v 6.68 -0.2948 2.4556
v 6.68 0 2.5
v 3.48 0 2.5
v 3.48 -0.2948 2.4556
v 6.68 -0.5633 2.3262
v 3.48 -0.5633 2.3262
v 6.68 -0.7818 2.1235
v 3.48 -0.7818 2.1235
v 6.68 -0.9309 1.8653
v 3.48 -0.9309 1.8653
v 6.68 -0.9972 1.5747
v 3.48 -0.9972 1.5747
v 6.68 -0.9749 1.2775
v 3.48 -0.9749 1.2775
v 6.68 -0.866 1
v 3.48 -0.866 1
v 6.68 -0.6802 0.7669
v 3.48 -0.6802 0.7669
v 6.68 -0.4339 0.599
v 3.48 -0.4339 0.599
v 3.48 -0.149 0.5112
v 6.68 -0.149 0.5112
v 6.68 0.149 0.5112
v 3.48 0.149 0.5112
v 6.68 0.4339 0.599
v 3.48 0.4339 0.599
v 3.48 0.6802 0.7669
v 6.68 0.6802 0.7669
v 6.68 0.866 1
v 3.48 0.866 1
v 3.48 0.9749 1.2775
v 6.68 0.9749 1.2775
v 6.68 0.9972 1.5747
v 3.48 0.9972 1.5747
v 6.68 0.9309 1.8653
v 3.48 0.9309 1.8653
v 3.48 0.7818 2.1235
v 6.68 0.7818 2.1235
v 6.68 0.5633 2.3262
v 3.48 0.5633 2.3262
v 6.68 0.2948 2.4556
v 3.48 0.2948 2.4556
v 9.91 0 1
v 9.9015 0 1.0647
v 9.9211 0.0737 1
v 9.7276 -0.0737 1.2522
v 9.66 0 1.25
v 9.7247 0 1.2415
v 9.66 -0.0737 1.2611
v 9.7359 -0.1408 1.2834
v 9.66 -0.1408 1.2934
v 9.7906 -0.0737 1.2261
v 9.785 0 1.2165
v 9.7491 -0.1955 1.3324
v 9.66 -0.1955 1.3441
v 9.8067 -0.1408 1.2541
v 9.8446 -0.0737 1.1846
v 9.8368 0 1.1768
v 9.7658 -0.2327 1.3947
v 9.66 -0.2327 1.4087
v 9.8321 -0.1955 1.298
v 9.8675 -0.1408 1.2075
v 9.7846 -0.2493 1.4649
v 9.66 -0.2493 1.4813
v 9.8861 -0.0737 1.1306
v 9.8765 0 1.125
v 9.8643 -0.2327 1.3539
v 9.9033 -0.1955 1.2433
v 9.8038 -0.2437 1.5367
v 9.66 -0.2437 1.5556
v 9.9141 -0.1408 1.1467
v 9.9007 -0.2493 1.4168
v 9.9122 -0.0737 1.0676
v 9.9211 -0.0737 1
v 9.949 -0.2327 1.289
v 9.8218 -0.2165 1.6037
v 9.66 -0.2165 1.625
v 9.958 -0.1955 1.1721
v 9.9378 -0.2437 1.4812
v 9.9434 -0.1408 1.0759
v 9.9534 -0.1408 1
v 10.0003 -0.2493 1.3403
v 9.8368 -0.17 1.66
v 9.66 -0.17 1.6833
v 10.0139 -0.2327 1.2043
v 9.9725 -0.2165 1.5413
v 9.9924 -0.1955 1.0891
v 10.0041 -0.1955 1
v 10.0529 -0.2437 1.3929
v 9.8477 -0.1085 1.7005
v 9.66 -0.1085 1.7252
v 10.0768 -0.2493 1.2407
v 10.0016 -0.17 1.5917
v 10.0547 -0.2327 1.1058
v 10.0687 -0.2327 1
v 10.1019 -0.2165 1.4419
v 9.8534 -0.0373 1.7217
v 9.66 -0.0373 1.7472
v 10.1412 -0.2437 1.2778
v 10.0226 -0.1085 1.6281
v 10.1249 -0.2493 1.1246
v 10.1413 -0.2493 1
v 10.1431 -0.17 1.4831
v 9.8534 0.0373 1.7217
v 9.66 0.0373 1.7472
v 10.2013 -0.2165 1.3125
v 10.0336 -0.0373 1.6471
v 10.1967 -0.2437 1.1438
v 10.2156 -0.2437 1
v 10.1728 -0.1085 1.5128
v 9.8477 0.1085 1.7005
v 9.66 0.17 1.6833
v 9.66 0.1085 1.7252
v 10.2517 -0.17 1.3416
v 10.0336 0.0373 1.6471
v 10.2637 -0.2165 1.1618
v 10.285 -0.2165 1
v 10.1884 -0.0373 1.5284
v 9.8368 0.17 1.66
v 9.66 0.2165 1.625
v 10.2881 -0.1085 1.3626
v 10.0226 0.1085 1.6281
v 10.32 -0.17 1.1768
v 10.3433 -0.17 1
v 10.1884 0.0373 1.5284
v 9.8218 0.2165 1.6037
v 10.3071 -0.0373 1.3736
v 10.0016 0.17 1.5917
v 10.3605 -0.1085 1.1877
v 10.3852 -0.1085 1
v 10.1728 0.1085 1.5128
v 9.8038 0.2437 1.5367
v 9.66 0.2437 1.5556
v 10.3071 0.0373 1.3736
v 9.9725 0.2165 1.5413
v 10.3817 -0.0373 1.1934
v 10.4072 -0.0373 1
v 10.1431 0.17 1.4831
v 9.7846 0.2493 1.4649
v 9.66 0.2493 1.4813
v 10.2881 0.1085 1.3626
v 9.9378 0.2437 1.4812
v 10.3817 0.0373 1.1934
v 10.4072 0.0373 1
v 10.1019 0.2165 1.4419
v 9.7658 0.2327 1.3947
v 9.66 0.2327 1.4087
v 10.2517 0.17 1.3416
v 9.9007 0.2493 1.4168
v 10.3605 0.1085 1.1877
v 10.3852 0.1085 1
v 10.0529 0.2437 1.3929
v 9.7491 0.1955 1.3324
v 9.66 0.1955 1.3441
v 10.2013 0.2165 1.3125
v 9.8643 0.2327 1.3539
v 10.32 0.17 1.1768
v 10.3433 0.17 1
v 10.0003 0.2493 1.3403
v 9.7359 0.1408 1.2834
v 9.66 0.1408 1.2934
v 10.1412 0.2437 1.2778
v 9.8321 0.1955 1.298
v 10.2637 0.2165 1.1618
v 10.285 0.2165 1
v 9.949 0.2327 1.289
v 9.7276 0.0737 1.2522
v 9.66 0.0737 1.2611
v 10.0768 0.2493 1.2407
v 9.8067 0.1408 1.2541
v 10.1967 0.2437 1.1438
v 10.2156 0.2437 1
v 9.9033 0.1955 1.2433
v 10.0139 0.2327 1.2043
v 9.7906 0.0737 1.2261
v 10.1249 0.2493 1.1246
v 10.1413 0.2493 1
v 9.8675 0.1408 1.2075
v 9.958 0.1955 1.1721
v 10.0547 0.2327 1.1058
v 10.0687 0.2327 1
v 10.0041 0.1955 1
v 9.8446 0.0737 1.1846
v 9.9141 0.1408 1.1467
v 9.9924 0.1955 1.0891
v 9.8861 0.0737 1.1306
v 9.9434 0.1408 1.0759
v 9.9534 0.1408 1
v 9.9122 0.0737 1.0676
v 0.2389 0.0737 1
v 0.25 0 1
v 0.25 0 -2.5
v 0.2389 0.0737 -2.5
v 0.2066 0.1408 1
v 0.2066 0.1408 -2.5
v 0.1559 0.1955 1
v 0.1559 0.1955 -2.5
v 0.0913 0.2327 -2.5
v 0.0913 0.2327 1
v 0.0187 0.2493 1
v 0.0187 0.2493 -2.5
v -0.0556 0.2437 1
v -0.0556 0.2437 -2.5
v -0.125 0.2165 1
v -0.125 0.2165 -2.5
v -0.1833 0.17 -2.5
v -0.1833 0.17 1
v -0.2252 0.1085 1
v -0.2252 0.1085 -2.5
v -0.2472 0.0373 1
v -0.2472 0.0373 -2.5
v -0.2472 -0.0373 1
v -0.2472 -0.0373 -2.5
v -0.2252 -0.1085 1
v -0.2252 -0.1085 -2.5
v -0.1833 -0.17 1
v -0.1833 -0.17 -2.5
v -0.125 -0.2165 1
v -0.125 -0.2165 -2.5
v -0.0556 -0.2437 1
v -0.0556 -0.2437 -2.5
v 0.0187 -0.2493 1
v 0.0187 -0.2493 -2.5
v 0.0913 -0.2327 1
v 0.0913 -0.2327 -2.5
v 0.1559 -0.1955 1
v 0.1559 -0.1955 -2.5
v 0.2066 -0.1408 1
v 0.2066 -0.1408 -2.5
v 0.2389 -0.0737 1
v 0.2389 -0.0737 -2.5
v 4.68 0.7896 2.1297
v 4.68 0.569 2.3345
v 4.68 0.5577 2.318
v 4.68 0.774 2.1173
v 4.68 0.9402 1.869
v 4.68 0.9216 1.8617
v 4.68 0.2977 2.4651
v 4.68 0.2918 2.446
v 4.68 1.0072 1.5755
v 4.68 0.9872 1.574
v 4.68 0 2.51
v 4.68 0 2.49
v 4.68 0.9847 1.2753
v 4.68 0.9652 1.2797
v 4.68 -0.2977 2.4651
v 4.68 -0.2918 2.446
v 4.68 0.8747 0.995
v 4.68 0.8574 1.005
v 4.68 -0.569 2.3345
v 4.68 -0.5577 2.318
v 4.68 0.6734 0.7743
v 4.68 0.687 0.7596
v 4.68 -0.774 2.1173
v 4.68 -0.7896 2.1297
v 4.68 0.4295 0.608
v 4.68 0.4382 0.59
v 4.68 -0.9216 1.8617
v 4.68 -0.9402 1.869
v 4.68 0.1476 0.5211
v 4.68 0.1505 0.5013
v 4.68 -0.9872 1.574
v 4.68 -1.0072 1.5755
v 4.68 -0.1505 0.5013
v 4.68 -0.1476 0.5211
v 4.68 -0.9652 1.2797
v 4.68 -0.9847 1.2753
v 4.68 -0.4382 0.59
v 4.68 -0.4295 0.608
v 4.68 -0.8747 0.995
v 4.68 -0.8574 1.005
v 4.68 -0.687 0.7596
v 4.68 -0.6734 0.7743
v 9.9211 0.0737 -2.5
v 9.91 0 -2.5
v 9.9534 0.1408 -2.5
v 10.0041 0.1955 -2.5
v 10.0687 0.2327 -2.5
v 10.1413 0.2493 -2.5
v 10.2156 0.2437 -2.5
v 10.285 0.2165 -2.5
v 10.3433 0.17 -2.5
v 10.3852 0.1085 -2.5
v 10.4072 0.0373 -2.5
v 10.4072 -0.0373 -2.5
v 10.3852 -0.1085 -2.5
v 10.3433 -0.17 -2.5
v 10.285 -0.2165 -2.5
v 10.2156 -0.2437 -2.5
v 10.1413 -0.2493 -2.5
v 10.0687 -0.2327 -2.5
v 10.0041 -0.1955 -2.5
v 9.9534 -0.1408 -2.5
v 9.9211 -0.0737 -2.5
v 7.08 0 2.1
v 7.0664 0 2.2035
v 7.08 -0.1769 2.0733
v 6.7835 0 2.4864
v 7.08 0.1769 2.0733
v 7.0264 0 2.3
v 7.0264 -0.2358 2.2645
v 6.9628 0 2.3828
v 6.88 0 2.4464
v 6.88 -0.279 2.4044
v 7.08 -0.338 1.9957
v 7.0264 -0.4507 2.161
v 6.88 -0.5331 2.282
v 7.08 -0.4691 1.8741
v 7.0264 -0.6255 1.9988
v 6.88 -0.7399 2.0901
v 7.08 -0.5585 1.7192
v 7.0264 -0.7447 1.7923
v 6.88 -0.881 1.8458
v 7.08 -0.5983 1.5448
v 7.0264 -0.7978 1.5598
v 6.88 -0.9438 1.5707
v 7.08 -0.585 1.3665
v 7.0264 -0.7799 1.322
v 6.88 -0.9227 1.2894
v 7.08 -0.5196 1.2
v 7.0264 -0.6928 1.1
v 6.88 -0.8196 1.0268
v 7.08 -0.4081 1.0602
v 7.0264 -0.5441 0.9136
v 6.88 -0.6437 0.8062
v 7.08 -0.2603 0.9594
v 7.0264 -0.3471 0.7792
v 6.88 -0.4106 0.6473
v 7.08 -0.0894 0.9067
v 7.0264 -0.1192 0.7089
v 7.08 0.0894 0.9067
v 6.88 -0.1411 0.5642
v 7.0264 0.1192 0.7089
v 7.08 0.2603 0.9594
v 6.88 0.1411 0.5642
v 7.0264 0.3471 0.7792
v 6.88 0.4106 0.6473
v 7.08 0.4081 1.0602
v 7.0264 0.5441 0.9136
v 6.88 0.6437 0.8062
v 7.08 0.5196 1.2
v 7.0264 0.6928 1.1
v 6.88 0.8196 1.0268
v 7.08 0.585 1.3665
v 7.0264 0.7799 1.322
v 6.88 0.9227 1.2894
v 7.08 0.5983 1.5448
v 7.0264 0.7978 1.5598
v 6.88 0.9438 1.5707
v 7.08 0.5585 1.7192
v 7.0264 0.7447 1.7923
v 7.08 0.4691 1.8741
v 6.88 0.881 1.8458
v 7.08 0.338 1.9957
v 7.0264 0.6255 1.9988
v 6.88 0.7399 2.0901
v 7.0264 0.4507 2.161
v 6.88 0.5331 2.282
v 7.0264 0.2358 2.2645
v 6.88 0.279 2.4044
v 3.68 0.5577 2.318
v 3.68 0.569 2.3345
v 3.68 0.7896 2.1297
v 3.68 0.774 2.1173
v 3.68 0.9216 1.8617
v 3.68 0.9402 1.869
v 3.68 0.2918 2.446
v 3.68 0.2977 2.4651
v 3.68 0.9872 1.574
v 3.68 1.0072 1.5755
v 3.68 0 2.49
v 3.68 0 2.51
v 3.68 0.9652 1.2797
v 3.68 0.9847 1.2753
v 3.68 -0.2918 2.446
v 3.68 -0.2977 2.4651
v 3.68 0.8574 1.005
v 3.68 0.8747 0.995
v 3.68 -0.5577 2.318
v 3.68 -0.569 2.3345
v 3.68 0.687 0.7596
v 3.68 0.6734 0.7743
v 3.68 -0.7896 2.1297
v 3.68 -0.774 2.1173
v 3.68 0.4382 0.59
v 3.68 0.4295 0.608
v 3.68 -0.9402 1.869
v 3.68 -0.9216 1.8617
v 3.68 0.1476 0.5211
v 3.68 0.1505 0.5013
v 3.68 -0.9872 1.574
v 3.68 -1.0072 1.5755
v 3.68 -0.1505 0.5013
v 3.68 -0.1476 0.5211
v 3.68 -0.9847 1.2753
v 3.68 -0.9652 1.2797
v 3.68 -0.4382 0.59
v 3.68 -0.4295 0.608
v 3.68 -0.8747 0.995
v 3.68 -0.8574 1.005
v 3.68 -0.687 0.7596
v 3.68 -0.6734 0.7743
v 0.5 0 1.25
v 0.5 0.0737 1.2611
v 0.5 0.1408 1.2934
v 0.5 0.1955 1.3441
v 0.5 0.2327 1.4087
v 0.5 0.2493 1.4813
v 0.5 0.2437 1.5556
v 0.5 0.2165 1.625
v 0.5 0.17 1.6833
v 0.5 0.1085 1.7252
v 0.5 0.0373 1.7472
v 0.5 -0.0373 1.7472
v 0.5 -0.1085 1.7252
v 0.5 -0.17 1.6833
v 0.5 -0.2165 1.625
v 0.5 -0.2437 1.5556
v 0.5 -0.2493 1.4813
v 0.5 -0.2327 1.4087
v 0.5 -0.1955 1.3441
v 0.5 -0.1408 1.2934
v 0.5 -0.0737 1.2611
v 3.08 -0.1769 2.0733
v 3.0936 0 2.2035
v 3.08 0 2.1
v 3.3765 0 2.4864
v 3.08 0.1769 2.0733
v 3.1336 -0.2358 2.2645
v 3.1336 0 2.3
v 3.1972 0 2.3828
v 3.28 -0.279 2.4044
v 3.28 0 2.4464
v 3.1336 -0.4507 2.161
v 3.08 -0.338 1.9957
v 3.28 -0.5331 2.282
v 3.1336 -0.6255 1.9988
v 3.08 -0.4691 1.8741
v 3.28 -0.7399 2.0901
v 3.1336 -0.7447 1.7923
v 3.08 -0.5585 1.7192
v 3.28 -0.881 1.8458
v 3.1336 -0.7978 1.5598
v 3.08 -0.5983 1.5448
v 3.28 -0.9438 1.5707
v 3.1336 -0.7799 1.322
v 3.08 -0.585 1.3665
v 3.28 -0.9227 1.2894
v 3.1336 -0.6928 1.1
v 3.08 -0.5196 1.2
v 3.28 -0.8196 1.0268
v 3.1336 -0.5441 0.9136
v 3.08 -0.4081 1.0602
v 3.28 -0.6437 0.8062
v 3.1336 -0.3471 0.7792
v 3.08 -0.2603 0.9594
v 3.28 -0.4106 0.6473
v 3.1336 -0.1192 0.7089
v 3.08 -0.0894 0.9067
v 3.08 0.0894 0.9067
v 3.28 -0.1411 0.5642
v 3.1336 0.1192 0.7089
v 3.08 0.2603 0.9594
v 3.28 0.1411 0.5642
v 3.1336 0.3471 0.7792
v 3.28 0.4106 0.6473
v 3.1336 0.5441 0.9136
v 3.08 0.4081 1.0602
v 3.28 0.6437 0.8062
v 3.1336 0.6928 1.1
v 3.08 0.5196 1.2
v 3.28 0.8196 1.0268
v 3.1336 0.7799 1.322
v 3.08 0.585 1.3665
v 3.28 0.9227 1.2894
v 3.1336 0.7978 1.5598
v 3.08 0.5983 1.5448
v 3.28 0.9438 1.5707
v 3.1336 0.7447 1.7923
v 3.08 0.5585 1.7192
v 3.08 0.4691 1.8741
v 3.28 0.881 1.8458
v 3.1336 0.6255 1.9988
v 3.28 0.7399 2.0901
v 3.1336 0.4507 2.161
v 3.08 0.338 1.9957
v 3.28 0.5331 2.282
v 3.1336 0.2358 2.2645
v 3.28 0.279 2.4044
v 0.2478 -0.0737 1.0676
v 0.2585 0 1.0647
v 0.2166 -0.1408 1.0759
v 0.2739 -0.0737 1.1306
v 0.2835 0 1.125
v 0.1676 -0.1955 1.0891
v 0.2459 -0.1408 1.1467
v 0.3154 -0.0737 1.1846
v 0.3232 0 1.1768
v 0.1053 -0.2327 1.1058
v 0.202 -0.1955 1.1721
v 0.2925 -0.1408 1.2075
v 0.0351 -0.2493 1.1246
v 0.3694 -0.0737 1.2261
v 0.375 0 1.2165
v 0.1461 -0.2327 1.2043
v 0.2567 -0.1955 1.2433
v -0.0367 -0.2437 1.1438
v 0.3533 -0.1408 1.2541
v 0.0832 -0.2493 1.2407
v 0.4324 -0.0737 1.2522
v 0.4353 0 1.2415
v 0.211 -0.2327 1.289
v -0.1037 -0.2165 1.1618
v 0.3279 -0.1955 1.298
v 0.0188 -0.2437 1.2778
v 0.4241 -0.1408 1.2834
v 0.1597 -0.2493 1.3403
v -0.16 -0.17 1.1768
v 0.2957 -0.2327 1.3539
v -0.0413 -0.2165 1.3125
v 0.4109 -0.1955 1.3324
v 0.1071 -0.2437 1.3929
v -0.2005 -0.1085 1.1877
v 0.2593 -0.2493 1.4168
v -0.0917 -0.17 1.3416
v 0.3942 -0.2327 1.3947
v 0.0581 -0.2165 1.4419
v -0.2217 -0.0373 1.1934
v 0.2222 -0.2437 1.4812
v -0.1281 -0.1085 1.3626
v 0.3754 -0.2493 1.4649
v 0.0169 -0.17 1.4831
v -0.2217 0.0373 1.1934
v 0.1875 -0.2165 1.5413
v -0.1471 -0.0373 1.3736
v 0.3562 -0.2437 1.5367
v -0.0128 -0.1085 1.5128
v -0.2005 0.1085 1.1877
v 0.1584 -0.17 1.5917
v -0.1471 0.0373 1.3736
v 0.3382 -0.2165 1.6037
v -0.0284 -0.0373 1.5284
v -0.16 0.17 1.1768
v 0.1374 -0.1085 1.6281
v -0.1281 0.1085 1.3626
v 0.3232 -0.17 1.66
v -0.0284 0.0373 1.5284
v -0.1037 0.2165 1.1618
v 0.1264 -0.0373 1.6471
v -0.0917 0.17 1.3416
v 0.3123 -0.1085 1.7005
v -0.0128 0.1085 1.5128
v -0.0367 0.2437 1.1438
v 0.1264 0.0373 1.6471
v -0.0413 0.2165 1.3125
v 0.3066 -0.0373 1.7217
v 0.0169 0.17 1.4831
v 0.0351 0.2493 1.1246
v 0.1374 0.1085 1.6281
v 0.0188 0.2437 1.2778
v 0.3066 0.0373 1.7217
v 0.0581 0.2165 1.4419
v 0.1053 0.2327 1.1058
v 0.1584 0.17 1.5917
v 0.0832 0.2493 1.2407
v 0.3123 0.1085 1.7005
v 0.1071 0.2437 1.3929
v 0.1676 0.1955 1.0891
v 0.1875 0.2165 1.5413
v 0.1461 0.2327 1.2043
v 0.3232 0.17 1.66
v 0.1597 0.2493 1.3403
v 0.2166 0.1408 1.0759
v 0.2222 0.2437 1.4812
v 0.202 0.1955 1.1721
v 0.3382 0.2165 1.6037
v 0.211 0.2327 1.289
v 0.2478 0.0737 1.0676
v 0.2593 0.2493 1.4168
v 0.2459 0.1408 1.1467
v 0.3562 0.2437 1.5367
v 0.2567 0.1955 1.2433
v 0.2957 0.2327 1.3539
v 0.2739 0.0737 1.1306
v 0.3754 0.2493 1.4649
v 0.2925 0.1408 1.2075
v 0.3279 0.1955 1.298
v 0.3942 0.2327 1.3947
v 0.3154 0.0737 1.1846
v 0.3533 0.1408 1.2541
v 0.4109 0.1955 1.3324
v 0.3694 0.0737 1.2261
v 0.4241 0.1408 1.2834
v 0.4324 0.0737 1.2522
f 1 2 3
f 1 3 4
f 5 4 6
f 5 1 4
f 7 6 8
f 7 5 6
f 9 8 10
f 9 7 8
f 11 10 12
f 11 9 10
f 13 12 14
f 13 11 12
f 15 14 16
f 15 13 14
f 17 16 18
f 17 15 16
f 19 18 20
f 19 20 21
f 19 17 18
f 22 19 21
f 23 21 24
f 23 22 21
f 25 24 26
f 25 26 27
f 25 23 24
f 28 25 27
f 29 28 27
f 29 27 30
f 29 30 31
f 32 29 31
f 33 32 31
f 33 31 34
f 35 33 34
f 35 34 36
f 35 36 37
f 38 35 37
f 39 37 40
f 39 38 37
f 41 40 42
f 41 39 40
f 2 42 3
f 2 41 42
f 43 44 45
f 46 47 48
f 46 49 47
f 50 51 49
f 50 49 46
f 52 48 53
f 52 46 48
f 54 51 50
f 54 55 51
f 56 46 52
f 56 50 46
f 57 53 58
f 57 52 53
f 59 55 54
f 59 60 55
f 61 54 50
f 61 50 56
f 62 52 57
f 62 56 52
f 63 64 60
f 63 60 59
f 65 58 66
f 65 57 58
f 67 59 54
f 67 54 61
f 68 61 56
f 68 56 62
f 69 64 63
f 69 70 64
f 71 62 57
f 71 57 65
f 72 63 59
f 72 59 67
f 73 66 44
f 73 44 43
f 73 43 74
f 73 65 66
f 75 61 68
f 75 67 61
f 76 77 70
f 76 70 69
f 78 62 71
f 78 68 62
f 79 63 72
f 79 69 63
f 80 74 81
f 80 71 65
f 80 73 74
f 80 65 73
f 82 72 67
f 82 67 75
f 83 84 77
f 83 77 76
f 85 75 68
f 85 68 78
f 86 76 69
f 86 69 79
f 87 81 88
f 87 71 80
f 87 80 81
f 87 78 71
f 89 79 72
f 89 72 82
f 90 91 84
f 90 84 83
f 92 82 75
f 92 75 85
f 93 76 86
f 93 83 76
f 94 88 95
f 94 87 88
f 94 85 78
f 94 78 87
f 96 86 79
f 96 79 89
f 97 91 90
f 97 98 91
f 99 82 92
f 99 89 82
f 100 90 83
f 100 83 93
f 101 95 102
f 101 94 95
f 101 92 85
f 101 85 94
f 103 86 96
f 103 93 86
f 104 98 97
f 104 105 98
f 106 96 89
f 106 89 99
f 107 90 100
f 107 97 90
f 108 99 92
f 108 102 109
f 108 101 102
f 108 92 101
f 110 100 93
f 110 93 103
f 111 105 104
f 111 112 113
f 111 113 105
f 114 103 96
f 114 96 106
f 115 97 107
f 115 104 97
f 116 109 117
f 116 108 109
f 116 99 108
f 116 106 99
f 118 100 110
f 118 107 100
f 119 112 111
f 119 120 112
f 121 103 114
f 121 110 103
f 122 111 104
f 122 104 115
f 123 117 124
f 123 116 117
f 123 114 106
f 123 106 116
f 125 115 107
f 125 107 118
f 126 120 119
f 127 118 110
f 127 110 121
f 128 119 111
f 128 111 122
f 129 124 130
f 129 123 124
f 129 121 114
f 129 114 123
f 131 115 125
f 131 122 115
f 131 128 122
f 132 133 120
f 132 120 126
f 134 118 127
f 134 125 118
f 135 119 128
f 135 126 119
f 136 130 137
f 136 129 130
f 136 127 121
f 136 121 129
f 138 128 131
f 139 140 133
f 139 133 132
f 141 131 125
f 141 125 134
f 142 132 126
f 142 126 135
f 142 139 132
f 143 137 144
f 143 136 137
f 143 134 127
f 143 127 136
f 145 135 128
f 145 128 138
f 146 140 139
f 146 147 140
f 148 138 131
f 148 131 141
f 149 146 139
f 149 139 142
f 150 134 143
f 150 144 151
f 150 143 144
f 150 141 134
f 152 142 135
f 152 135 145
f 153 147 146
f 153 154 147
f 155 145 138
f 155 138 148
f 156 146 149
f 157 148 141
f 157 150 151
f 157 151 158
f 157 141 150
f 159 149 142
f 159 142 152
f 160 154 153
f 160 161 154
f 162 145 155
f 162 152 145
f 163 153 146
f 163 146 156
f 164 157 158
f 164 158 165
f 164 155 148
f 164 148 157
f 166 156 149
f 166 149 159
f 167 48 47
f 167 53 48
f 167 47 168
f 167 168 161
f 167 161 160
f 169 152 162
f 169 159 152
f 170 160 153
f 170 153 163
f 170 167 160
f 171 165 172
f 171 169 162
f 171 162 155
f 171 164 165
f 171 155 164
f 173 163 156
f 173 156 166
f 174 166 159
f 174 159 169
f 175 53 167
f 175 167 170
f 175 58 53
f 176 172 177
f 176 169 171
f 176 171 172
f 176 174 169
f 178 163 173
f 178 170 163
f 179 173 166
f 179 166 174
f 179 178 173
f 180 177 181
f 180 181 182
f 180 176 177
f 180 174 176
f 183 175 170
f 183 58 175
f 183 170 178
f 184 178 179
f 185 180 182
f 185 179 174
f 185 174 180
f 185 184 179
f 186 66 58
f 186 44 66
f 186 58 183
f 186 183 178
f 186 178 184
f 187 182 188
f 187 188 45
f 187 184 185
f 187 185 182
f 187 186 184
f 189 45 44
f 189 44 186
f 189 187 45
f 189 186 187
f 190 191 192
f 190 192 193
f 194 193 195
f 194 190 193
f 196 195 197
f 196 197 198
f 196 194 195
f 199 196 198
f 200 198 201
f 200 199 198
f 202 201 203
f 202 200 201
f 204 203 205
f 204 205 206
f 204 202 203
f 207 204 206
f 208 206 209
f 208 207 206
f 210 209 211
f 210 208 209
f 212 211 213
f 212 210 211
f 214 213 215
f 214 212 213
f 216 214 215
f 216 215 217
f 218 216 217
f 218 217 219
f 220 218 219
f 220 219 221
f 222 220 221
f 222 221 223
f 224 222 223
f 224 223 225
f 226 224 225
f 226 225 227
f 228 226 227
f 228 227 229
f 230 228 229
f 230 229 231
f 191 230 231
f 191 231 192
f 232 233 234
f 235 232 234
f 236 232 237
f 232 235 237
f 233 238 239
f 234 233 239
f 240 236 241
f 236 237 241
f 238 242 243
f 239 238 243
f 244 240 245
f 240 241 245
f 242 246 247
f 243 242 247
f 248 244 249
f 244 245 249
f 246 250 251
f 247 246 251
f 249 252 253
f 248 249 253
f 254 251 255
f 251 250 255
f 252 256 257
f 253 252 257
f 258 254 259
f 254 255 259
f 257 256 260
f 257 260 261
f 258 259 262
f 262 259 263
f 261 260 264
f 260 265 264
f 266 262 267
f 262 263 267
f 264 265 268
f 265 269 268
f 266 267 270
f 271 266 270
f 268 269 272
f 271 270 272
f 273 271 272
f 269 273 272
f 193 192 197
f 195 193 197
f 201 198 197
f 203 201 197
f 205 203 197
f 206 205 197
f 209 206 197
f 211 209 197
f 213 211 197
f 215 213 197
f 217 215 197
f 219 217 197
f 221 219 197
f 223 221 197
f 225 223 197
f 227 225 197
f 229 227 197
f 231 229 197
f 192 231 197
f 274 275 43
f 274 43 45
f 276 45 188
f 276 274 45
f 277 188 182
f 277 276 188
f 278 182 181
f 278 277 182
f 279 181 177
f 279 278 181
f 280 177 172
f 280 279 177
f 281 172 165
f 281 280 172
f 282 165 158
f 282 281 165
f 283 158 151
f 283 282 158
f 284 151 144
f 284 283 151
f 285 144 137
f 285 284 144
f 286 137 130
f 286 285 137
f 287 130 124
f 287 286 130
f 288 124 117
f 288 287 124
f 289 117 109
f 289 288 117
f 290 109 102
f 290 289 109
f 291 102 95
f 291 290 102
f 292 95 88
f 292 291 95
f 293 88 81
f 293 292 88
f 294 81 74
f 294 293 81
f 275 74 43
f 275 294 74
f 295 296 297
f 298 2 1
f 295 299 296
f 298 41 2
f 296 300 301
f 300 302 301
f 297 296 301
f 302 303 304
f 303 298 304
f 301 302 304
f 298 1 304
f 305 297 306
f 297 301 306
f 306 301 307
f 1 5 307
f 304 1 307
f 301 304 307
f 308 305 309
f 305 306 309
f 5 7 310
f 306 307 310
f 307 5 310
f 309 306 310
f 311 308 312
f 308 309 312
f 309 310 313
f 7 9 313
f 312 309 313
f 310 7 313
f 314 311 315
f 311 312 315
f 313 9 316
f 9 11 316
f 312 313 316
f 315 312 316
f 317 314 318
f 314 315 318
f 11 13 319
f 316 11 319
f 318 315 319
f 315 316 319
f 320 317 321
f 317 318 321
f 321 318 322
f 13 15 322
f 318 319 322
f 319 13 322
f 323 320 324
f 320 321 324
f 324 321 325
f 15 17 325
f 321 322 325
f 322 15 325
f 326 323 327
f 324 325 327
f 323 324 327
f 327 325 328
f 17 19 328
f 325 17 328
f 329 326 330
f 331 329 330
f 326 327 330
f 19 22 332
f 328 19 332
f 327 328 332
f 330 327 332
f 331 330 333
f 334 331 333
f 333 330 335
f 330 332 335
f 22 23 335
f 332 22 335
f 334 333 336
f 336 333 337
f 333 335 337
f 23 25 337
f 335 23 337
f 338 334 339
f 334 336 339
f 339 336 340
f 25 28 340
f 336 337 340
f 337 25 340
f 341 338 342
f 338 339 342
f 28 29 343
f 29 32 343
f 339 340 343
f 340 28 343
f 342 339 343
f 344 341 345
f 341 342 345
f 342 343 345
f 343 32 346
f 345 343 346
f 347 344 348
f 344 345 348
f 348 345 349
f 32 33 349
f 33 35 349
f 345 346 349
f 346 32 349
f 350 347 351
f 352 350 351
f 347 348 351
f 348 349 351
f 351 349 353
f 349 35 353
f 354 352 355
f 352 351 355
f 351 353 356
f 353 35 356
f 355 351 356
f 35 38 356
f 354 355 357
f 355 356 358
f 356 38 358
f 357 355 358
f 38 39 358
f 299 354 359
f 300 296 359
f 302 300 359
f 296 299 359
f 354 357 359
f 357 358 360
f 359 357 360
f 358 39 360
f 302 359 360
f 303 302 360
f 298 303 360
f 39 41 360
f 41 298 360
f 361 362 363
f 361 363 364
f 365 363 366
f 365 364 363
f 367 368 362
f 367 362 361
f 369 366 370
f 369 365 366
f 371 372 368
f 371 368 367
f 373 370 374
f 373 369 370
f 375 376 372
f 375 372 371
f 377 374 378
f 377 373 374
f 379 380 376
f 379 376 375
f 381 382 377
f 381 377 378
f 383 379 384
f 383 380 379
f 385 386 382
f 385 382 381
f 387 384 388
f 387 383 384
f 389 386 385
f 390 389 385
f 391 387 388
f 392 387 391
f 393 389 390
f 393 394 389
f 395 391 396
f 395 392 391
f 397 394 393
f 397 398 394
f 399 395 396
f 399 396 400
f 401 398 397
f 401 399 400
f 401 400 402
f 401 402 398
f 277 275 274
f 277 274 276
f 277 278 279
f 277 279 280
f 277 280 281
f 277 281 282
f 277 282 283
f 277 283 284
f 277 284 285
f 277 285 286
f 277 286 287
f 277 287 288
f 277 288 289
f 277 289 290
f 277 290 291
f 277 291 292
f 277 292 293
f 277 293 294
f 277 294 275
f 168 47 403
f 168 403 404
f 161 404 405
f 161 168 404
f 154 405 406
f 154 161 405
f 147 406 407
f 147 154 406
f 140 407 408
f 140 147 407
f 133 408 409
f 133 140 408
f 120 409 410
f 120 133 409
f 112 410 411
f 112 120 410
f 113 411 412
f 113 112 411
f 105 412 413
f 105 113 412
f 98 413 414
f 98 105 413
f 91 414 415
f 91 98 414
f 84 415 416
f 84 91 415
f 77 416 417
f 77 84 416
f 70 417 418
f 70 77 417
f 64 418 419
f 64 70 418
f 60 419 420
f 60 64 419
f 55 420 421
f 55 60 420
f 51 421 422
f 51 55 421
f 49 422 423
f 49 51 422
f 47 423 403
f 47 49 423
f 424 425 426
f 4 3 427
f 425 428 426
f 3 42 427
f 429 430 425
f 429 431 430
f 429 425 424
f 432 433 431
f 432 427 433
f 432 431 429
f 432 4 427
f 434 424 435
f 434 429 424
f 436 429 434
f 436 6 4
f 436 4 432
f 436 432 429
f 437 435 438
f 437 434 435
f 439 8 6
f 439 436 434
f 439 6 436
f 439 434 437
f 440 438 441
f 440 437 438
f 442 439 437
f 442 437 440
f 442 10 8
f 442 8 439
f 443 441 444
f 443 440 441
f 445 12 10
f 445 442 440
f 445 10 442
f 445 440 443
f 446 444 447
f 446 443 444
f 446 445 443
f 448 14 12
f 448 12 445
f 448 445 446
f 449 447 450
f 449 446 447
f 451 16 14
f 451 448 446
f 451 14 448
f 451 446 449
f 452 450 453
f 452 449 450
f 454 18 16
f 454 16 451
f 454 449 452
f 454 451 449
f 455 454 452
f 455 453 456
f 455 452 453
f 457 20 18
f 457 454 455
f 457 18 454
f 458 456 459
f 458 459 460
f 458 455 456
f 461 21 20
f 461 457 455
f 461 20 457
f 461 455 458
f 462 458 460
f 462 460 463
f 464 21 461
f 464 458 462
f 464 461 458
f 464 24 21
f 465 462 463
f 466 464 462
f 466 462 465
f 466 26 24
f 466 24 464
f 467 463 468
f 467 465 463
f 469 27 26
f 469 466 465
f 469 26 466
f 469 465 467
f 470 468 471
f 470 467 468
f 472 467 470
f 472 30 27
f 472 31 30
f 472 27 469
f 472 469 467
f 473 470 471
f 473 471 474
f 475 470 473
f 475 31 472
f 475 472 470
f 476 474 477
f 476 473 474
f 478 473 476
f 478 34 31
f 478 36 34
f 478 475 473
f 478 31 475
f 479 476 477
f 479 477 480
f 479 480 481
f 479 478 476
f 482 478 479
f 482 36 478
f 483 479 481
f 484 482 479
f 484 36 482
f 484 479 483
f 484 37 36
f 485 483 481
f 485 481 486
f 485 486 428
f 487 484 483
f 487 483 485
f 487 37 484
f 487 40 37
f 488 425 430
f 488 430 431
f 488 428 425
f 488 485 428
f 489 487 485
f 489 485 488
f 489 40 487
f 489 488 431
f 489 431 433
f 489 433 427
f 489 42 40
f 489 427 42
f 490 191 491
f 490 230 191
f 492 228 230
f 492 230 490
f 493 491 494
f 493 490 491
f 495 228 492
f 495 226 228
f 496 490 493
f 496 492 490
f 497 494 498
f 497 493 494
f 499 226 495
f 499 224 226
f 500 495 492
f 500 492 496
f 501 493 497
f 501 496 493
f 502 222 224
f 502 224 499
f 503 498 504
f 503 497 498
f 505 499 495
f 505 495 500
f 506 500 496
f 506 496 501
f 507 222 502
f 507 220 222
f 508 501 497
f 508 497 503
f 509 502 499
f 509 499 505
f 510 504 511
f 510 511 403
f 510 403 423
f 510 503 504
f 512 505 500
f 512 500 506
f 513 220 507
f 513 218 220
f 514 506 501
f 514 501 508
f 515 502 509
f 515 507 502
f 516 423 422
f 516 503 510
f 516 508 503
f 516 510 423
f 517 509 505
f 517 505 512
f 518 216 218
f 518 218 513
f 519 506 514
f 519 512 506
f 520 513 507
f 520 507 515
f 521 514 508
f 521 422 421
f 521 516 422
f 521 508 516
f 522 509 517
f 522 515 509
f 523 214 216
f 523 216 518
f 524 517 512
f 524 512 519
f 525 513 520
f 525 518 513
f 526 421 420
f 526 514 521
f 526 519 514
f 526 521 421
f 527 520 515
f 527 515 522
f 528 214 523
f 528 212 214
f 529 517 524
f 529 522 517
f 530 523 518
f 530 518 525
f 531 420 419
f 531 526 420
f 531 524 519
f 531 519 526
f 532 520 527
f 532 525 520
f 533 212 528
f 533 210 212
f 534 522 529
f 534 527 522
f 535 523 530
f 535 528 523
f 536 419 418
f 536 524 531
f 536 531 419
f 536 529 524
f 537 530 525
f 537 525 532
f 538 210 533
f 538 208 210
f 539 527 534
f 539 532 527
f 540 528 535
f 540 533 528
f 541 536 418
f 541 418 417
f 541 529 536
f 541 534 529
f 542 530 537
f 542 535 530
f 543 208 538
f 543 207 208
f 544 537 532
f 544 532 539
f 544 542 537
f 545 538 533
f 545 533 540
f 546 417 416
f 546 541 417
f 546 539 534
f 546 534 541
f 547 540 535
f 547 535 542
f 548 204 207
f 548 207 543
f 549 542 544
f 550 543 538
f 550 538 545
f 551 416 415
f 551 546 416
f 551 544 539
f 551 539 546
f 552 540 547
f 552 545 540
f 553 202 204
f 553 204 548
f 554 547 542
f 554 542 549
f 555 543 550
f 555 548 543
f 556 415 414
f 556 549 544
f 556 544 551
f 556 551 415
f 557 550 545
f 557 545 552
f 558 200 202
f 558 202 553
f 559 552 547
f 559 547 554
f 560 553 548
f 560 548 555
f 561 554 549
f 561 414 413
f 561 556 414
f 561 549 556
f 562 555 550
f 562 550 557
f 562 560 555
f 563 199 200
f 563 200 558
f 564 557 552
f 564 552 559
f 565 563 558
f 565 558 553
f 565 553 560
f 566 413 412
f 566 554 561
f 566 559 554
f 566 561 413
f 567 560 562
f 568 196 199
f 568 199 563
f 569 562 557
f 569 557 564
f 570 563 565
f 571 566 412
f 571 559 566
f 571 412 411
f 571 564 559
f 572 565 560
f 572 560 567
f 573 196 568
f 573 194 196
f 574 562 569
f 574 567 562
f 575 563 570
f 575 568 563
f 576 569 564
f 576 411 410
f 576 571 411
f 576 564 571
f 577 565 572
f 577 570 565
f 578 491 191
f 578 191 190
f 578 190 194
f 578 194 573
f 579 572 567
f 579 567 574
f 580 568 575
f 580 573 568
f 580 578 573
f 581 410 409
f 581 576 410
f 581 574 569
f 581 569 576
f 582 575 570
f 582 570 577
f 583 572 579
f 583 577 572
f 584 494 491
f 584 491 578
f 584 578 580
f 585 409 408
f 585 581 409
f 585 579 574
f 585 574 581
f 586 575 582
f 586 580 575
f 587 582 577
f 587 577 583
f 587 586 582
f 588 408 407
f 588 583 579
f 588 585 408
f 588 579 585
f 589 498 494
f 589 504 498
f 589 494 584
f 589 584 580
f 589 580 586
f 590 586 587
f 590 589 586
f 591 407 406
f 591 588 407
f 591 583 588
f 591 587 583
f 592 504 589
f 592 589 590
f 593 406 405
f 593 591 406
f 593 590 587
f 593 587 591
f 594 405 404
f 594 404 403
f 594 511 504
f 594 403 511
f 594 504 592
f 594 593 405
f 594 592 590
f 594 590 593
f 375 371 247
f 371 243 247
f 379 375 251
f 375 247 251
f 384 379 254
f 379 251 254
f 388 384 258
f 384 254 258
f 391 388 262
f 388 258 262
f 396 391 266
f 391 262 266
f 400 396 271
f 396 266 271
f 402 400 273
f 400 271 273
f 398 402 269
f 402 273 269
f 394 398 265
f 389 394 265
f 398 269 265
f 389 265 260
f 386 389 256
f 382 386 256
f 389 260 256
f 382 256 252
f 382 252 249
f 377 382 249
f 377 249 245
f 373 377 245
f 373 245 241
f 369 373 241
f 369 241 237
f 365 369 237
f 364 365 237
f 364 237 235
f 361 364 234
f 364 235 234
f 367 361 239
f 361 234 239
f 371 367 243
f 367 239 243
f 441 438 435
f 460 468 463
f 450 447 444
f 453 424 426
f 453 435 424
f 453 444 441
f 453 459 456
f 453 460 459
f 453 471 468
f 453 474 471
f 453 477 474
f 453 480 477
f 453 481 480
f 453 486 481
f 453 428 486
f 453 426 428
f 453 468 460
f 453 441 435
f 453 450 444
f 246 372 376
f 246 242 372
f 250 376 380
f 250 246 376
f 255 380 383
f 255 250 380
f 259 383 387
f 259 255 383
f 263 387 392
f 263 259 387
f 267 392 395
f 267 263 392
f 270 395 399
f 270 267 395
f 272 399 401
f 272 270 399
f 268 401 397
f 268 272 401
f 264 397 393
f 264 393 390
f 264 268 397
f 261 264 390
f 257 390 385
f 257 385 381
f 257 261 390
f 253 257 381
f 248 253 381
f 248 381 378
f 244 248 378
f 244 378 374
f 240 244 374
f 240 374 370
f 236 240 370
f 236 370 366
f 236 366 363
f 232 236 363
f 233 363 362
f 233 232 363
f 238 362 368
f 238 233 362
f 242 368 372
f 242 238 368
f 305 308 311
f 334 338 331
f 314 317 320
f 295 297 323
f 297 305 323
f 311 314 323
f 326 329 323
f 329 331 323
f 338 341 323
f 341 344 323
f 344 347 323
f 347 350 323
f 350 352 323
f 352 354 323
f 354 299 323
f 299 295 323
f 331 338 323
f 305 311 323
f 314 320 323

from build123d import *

# Parameters (mm, degrees)
SKETCH002_W = 4
SKETCH002_H = 1
FILLET_R    = 0.4
SKETCH003_W = 1
SKETCH003_H = 0.02
SKETCH_R    = 0.25


with BuildPart() as fillet_body:
    # Sketch002 → Revolution (revolve)
    with BuildSketch(Plane.XZ):
        with Locations((5.08, 2)):
            Rectangle(SKETCH002_W, SKETCH002_H)
    revolve(axis=Axis((3.08, 0, 1.5), (1, 0, 0)))

    # Fillet
    fillet_edges = [fillet_body.edges().sort_by_distance(p)[0] for p in [
        (3.08, 0, 0.5),
        (7.08, 0, 0.5),
    ]]
    fillet(fillet_edges, radius=FILLET_R)


with BuildPart() as revolution001:
    # Sketch003 → Revolution001 (revolve)
    with BuildSketch(Plane.XZ):
        with Locations((4.18, 2.5)):
            Rectangle(SKETCH003_W, SKETCH003_H)
    revolve(axis=Axis((0, 0, 1.5), (1, 0, 0)))


with BuildPart() as sweep_body:
    # Sweep: sweep along a path in Sketch001
    with BuildLine(Plane.XZ) as sweep_path:
        Line((0, -2.5), (0, 1))
        ThreePointArc((0, 1), (0.146447, 1.353553), (0.5, 1.5))
        Line((0.5, 1.5), (9.66, 1.5))
        ThreePointArc((9.66, 1.5), (10.013553, 1.353553), (10.16, 1))
        Line((10.16, 1), (10.16, -2.5))
    # Sketch → Sweep (sweep)
    with BuildSketch(Plane.XY.offset(-2)):
        Circle(SKETCH_R)
    sweep(path=sweep_path.line)


solid = Compound([fillet_body.part, revolution001.part, sweep_body.part])
